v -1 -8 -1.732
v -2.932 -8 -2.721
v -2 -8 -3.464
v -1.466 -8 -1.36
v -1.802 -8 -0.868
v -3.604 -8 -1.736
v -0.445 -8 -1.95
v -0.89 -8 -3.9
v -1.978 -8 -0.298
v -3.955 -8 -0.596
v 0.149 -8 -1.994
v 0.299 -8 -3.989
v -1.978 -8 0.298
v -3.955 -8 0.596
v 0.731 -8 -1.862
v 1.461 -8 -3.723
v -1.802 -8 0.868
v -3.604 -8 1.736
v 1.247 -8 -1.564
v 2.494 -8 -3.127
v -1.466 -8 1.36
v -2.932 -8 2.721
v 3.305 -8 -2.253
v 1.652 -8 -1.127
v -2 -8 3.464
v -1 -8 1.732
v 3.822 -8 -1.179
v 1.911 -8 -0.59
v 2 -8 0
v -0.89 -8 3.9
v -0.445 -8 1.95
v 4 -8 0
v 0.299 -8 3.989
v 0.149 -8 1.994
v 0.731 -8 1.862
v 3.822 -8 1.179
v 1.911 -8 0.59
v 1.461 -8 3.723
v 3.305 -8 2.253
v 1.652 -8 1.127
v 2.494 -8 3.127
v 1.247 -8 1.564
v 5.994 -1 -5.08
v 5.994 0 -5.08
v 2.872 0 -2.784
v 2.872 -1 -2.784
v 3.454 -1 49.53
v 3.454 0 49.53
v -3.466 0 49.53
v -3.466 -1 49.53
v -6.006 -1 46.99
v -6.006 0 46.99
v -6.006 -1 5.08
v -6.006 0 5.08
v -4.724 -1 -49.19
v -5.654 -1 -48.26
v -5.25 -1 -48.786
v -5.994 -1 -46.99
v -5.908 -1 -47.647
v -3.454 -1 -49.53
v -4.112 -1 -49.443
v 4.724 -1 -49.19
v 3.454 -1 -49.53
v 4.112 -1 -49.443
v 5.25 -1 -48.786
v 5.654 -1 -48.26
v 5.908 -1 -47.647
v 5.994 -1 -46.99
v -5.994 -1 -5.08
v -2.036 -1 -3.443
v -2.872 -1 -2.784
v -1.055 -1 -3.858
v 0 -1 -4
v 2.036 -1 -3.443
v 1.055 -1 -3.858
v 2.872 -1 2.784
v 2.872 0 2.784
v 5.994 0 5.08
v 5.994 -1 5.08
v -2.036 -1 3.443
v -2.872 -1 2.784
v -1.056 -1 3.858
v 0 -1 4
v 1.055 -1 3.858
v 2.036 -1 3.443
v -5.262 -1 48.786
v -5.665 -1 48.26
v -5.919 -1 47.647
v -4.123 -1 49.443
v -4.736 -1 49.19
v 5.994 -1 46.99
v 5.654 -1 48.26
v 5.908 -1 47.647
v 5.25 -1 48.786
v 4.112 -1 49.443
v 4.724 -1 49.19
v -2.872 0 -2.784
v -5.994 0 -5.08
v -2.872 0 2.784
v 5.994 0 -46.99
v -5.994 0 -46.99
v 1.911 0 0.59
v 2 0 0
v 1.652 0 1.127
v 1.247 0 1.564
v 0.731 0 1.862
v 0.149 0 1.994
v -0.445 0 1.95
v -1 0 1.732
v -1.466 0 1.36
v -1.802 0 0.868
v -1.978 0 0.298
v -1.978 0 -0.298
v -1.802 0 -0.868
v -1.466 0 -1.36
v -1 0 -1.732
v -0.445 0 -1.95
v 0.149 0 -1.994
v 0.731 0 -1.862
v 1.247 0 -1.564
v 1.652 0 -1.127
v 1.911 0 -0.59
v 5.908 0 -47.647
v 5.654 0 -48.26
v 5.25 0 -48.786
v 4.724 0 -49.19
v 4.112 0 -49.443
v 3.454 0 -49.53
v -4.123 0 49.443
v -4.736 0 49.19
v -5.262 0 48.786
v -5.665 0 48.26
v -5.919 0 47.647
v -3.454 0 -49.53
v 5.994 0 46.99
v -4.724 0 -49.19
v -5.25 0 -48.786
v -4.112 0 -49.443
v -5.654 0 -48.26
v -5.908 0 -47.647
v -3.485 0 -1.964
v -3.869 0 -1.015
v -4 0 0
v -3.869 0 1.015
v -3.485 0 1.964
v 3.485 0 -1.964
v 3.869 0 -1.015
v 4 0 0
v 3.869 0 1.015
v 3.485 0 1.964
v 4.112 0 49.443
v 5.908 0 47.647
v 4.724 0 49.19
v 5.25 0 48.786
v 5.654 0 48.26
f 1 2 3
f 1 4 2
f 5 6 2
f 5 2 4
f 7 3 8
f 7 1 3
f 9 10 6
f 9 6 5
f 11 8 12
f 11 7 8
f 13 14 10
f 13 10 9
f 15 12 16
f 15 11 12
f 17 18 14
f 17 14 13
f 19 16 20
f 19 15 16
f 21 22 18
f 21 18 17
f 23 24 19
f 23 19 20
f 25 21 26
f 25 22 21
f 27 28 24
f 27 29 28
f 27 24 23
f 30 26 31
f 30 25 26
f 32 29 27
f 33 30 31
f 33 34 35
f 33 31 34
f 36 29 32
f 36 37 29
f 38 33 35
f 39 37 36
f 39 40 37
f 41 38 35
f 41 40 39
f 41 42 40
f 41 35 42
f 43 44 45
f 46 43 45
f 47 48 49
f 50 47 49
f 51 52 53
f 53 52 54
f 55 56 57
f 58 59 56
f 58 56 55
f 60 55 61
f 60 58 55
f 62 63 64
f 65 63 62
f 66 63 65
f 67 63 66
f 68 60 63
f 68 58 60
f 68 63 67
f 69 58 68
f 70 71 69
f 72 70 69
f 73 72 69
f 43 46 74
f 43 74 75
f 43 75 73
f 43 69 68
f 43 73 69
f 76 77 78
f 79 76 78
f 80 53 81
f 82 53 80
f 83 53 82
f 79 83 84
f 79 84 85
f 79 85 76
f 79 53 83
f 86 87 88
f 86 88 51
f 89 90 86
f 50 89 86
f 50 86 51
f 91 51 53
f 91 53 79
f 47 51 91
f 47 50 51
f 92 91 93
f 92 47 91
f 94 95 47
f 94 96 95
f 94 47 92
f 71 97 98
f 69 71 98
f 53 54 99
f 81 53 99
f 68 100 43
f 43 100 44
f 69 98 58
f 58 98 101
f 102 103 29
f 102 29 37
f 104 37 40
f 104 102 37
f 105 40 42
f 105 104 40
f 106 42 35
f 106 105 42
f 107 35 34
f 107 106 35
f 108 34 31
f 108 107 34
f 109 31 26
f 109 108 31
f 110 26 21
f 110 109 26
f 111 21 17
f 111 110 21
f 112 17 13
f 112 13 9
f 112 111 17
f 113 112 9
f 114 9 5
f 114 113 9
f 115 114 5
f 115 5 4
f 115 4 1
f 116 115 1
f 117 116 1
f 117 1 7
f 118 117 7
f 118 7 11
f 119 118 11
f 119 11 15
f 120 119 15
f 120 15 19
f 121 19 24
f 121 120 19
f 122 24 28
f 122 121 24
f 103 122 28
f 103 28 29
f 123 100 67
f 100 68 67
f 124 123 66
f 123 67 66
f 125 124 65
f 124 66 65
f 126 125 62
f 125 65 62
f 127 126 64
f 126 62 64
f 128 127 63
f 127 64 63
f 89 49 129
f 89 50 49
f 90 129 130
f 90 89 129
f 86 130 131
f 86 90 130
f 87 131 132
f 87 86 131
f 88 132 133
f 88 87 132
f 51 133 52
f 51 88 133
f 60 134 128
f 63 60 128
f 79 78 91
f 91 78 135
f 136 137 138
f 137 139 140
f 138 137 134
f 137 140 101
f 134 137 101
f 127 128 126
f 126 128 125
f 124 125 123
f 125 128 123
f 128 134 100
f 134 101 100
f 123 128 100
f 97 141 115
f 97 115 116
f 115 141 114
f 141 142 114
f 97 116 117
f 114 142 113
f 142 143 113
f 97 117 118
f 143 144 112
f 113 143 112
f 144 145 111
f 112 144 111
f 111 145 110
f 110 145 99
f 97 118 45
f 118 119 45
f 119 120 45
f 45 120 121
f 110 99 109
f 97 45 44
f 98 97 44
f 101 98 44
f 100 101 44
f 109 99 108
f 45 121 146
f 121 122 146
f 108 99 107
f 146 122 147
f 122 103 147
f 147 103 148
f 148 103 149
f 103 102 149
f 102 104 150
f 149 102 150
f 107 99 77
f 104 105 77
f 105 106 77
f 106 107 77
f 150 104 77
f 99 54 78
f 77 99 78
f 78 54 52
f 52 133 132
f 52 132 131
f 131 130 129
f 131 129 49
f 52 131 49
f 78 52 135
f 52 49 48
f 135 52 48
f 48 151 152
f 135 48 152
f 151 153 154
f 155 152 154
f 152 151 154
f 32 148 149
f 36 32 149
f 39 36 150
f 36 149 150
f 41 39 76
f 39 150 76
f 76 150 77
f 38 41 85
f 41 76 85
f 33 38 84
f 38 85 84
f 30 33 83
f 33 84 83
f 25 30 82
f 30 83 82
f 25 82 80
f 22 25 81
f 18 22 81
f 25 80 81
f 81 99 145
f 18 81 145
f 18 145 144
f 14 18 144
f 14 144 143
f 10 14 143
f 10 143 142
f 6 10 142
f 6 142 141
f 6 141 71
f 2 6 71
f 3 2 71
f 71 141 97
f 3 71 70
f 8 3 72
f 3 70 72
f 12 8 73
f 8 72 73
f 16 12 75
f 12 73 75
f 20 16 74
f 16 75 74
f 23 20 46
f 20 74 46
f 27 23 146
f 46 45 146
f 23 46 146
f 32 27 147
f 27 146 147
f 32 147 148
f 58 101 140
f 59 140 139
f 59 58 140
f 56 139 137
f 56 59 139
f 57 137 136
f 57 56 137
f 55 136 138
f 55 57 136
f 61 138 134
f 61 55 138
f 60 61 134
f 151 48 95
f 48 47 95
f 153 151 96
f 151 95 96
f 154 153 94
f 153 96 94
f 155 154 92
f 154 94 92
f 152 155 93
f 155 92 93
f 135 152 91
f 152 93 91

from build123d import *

# Parameters (mm, degrees)
F0_R     = 4
F0_R_2   = 2
F1_DEPTH = 8
F3_DEPTH = 1
F4_R     = 2.54


with BuildPart() as f1:
    # F0 (on Front) → F1 (new body)
    with BuildSketch(Plane.XZ):
        Circle(F0_R)
        Circle(F0_R_2, mode=Mode.SUBTRACT)
    extrude(amount=F1_DEPTH)

    # F2 (on Front) → F3 (join)
    with BuildSketch(Plane.XZ):
        Polygon((5.9944, 49.53), (-6.0056, 49.53), (-6.0056, 5.08), (-2.54, 2.54), (2.54, 2.54), (5.9944, 5.08), align=None)
        Polygon((-5.9944, -5.08), (-5.9944, -49.53), (5.9944, -49.53), (5.9944, -5.08), (2.54, -2.54), (-2.54, -2.54), align=None)
    extrude(amount=F3_DEPTH)

    # F4
    f4_edges = [f1.edges().sort_by_distance(p)[0] for p in [
        (-6.0056, -0.5, 49.53),
        (5.9944, -0.5, 49.53),
        (5.9944, -0.5, -49.53),
        (-5.9944, -0.5, -49.53),
    ]]
    fillet(f4_edges, radius=F4_R)


solid = f1.part
